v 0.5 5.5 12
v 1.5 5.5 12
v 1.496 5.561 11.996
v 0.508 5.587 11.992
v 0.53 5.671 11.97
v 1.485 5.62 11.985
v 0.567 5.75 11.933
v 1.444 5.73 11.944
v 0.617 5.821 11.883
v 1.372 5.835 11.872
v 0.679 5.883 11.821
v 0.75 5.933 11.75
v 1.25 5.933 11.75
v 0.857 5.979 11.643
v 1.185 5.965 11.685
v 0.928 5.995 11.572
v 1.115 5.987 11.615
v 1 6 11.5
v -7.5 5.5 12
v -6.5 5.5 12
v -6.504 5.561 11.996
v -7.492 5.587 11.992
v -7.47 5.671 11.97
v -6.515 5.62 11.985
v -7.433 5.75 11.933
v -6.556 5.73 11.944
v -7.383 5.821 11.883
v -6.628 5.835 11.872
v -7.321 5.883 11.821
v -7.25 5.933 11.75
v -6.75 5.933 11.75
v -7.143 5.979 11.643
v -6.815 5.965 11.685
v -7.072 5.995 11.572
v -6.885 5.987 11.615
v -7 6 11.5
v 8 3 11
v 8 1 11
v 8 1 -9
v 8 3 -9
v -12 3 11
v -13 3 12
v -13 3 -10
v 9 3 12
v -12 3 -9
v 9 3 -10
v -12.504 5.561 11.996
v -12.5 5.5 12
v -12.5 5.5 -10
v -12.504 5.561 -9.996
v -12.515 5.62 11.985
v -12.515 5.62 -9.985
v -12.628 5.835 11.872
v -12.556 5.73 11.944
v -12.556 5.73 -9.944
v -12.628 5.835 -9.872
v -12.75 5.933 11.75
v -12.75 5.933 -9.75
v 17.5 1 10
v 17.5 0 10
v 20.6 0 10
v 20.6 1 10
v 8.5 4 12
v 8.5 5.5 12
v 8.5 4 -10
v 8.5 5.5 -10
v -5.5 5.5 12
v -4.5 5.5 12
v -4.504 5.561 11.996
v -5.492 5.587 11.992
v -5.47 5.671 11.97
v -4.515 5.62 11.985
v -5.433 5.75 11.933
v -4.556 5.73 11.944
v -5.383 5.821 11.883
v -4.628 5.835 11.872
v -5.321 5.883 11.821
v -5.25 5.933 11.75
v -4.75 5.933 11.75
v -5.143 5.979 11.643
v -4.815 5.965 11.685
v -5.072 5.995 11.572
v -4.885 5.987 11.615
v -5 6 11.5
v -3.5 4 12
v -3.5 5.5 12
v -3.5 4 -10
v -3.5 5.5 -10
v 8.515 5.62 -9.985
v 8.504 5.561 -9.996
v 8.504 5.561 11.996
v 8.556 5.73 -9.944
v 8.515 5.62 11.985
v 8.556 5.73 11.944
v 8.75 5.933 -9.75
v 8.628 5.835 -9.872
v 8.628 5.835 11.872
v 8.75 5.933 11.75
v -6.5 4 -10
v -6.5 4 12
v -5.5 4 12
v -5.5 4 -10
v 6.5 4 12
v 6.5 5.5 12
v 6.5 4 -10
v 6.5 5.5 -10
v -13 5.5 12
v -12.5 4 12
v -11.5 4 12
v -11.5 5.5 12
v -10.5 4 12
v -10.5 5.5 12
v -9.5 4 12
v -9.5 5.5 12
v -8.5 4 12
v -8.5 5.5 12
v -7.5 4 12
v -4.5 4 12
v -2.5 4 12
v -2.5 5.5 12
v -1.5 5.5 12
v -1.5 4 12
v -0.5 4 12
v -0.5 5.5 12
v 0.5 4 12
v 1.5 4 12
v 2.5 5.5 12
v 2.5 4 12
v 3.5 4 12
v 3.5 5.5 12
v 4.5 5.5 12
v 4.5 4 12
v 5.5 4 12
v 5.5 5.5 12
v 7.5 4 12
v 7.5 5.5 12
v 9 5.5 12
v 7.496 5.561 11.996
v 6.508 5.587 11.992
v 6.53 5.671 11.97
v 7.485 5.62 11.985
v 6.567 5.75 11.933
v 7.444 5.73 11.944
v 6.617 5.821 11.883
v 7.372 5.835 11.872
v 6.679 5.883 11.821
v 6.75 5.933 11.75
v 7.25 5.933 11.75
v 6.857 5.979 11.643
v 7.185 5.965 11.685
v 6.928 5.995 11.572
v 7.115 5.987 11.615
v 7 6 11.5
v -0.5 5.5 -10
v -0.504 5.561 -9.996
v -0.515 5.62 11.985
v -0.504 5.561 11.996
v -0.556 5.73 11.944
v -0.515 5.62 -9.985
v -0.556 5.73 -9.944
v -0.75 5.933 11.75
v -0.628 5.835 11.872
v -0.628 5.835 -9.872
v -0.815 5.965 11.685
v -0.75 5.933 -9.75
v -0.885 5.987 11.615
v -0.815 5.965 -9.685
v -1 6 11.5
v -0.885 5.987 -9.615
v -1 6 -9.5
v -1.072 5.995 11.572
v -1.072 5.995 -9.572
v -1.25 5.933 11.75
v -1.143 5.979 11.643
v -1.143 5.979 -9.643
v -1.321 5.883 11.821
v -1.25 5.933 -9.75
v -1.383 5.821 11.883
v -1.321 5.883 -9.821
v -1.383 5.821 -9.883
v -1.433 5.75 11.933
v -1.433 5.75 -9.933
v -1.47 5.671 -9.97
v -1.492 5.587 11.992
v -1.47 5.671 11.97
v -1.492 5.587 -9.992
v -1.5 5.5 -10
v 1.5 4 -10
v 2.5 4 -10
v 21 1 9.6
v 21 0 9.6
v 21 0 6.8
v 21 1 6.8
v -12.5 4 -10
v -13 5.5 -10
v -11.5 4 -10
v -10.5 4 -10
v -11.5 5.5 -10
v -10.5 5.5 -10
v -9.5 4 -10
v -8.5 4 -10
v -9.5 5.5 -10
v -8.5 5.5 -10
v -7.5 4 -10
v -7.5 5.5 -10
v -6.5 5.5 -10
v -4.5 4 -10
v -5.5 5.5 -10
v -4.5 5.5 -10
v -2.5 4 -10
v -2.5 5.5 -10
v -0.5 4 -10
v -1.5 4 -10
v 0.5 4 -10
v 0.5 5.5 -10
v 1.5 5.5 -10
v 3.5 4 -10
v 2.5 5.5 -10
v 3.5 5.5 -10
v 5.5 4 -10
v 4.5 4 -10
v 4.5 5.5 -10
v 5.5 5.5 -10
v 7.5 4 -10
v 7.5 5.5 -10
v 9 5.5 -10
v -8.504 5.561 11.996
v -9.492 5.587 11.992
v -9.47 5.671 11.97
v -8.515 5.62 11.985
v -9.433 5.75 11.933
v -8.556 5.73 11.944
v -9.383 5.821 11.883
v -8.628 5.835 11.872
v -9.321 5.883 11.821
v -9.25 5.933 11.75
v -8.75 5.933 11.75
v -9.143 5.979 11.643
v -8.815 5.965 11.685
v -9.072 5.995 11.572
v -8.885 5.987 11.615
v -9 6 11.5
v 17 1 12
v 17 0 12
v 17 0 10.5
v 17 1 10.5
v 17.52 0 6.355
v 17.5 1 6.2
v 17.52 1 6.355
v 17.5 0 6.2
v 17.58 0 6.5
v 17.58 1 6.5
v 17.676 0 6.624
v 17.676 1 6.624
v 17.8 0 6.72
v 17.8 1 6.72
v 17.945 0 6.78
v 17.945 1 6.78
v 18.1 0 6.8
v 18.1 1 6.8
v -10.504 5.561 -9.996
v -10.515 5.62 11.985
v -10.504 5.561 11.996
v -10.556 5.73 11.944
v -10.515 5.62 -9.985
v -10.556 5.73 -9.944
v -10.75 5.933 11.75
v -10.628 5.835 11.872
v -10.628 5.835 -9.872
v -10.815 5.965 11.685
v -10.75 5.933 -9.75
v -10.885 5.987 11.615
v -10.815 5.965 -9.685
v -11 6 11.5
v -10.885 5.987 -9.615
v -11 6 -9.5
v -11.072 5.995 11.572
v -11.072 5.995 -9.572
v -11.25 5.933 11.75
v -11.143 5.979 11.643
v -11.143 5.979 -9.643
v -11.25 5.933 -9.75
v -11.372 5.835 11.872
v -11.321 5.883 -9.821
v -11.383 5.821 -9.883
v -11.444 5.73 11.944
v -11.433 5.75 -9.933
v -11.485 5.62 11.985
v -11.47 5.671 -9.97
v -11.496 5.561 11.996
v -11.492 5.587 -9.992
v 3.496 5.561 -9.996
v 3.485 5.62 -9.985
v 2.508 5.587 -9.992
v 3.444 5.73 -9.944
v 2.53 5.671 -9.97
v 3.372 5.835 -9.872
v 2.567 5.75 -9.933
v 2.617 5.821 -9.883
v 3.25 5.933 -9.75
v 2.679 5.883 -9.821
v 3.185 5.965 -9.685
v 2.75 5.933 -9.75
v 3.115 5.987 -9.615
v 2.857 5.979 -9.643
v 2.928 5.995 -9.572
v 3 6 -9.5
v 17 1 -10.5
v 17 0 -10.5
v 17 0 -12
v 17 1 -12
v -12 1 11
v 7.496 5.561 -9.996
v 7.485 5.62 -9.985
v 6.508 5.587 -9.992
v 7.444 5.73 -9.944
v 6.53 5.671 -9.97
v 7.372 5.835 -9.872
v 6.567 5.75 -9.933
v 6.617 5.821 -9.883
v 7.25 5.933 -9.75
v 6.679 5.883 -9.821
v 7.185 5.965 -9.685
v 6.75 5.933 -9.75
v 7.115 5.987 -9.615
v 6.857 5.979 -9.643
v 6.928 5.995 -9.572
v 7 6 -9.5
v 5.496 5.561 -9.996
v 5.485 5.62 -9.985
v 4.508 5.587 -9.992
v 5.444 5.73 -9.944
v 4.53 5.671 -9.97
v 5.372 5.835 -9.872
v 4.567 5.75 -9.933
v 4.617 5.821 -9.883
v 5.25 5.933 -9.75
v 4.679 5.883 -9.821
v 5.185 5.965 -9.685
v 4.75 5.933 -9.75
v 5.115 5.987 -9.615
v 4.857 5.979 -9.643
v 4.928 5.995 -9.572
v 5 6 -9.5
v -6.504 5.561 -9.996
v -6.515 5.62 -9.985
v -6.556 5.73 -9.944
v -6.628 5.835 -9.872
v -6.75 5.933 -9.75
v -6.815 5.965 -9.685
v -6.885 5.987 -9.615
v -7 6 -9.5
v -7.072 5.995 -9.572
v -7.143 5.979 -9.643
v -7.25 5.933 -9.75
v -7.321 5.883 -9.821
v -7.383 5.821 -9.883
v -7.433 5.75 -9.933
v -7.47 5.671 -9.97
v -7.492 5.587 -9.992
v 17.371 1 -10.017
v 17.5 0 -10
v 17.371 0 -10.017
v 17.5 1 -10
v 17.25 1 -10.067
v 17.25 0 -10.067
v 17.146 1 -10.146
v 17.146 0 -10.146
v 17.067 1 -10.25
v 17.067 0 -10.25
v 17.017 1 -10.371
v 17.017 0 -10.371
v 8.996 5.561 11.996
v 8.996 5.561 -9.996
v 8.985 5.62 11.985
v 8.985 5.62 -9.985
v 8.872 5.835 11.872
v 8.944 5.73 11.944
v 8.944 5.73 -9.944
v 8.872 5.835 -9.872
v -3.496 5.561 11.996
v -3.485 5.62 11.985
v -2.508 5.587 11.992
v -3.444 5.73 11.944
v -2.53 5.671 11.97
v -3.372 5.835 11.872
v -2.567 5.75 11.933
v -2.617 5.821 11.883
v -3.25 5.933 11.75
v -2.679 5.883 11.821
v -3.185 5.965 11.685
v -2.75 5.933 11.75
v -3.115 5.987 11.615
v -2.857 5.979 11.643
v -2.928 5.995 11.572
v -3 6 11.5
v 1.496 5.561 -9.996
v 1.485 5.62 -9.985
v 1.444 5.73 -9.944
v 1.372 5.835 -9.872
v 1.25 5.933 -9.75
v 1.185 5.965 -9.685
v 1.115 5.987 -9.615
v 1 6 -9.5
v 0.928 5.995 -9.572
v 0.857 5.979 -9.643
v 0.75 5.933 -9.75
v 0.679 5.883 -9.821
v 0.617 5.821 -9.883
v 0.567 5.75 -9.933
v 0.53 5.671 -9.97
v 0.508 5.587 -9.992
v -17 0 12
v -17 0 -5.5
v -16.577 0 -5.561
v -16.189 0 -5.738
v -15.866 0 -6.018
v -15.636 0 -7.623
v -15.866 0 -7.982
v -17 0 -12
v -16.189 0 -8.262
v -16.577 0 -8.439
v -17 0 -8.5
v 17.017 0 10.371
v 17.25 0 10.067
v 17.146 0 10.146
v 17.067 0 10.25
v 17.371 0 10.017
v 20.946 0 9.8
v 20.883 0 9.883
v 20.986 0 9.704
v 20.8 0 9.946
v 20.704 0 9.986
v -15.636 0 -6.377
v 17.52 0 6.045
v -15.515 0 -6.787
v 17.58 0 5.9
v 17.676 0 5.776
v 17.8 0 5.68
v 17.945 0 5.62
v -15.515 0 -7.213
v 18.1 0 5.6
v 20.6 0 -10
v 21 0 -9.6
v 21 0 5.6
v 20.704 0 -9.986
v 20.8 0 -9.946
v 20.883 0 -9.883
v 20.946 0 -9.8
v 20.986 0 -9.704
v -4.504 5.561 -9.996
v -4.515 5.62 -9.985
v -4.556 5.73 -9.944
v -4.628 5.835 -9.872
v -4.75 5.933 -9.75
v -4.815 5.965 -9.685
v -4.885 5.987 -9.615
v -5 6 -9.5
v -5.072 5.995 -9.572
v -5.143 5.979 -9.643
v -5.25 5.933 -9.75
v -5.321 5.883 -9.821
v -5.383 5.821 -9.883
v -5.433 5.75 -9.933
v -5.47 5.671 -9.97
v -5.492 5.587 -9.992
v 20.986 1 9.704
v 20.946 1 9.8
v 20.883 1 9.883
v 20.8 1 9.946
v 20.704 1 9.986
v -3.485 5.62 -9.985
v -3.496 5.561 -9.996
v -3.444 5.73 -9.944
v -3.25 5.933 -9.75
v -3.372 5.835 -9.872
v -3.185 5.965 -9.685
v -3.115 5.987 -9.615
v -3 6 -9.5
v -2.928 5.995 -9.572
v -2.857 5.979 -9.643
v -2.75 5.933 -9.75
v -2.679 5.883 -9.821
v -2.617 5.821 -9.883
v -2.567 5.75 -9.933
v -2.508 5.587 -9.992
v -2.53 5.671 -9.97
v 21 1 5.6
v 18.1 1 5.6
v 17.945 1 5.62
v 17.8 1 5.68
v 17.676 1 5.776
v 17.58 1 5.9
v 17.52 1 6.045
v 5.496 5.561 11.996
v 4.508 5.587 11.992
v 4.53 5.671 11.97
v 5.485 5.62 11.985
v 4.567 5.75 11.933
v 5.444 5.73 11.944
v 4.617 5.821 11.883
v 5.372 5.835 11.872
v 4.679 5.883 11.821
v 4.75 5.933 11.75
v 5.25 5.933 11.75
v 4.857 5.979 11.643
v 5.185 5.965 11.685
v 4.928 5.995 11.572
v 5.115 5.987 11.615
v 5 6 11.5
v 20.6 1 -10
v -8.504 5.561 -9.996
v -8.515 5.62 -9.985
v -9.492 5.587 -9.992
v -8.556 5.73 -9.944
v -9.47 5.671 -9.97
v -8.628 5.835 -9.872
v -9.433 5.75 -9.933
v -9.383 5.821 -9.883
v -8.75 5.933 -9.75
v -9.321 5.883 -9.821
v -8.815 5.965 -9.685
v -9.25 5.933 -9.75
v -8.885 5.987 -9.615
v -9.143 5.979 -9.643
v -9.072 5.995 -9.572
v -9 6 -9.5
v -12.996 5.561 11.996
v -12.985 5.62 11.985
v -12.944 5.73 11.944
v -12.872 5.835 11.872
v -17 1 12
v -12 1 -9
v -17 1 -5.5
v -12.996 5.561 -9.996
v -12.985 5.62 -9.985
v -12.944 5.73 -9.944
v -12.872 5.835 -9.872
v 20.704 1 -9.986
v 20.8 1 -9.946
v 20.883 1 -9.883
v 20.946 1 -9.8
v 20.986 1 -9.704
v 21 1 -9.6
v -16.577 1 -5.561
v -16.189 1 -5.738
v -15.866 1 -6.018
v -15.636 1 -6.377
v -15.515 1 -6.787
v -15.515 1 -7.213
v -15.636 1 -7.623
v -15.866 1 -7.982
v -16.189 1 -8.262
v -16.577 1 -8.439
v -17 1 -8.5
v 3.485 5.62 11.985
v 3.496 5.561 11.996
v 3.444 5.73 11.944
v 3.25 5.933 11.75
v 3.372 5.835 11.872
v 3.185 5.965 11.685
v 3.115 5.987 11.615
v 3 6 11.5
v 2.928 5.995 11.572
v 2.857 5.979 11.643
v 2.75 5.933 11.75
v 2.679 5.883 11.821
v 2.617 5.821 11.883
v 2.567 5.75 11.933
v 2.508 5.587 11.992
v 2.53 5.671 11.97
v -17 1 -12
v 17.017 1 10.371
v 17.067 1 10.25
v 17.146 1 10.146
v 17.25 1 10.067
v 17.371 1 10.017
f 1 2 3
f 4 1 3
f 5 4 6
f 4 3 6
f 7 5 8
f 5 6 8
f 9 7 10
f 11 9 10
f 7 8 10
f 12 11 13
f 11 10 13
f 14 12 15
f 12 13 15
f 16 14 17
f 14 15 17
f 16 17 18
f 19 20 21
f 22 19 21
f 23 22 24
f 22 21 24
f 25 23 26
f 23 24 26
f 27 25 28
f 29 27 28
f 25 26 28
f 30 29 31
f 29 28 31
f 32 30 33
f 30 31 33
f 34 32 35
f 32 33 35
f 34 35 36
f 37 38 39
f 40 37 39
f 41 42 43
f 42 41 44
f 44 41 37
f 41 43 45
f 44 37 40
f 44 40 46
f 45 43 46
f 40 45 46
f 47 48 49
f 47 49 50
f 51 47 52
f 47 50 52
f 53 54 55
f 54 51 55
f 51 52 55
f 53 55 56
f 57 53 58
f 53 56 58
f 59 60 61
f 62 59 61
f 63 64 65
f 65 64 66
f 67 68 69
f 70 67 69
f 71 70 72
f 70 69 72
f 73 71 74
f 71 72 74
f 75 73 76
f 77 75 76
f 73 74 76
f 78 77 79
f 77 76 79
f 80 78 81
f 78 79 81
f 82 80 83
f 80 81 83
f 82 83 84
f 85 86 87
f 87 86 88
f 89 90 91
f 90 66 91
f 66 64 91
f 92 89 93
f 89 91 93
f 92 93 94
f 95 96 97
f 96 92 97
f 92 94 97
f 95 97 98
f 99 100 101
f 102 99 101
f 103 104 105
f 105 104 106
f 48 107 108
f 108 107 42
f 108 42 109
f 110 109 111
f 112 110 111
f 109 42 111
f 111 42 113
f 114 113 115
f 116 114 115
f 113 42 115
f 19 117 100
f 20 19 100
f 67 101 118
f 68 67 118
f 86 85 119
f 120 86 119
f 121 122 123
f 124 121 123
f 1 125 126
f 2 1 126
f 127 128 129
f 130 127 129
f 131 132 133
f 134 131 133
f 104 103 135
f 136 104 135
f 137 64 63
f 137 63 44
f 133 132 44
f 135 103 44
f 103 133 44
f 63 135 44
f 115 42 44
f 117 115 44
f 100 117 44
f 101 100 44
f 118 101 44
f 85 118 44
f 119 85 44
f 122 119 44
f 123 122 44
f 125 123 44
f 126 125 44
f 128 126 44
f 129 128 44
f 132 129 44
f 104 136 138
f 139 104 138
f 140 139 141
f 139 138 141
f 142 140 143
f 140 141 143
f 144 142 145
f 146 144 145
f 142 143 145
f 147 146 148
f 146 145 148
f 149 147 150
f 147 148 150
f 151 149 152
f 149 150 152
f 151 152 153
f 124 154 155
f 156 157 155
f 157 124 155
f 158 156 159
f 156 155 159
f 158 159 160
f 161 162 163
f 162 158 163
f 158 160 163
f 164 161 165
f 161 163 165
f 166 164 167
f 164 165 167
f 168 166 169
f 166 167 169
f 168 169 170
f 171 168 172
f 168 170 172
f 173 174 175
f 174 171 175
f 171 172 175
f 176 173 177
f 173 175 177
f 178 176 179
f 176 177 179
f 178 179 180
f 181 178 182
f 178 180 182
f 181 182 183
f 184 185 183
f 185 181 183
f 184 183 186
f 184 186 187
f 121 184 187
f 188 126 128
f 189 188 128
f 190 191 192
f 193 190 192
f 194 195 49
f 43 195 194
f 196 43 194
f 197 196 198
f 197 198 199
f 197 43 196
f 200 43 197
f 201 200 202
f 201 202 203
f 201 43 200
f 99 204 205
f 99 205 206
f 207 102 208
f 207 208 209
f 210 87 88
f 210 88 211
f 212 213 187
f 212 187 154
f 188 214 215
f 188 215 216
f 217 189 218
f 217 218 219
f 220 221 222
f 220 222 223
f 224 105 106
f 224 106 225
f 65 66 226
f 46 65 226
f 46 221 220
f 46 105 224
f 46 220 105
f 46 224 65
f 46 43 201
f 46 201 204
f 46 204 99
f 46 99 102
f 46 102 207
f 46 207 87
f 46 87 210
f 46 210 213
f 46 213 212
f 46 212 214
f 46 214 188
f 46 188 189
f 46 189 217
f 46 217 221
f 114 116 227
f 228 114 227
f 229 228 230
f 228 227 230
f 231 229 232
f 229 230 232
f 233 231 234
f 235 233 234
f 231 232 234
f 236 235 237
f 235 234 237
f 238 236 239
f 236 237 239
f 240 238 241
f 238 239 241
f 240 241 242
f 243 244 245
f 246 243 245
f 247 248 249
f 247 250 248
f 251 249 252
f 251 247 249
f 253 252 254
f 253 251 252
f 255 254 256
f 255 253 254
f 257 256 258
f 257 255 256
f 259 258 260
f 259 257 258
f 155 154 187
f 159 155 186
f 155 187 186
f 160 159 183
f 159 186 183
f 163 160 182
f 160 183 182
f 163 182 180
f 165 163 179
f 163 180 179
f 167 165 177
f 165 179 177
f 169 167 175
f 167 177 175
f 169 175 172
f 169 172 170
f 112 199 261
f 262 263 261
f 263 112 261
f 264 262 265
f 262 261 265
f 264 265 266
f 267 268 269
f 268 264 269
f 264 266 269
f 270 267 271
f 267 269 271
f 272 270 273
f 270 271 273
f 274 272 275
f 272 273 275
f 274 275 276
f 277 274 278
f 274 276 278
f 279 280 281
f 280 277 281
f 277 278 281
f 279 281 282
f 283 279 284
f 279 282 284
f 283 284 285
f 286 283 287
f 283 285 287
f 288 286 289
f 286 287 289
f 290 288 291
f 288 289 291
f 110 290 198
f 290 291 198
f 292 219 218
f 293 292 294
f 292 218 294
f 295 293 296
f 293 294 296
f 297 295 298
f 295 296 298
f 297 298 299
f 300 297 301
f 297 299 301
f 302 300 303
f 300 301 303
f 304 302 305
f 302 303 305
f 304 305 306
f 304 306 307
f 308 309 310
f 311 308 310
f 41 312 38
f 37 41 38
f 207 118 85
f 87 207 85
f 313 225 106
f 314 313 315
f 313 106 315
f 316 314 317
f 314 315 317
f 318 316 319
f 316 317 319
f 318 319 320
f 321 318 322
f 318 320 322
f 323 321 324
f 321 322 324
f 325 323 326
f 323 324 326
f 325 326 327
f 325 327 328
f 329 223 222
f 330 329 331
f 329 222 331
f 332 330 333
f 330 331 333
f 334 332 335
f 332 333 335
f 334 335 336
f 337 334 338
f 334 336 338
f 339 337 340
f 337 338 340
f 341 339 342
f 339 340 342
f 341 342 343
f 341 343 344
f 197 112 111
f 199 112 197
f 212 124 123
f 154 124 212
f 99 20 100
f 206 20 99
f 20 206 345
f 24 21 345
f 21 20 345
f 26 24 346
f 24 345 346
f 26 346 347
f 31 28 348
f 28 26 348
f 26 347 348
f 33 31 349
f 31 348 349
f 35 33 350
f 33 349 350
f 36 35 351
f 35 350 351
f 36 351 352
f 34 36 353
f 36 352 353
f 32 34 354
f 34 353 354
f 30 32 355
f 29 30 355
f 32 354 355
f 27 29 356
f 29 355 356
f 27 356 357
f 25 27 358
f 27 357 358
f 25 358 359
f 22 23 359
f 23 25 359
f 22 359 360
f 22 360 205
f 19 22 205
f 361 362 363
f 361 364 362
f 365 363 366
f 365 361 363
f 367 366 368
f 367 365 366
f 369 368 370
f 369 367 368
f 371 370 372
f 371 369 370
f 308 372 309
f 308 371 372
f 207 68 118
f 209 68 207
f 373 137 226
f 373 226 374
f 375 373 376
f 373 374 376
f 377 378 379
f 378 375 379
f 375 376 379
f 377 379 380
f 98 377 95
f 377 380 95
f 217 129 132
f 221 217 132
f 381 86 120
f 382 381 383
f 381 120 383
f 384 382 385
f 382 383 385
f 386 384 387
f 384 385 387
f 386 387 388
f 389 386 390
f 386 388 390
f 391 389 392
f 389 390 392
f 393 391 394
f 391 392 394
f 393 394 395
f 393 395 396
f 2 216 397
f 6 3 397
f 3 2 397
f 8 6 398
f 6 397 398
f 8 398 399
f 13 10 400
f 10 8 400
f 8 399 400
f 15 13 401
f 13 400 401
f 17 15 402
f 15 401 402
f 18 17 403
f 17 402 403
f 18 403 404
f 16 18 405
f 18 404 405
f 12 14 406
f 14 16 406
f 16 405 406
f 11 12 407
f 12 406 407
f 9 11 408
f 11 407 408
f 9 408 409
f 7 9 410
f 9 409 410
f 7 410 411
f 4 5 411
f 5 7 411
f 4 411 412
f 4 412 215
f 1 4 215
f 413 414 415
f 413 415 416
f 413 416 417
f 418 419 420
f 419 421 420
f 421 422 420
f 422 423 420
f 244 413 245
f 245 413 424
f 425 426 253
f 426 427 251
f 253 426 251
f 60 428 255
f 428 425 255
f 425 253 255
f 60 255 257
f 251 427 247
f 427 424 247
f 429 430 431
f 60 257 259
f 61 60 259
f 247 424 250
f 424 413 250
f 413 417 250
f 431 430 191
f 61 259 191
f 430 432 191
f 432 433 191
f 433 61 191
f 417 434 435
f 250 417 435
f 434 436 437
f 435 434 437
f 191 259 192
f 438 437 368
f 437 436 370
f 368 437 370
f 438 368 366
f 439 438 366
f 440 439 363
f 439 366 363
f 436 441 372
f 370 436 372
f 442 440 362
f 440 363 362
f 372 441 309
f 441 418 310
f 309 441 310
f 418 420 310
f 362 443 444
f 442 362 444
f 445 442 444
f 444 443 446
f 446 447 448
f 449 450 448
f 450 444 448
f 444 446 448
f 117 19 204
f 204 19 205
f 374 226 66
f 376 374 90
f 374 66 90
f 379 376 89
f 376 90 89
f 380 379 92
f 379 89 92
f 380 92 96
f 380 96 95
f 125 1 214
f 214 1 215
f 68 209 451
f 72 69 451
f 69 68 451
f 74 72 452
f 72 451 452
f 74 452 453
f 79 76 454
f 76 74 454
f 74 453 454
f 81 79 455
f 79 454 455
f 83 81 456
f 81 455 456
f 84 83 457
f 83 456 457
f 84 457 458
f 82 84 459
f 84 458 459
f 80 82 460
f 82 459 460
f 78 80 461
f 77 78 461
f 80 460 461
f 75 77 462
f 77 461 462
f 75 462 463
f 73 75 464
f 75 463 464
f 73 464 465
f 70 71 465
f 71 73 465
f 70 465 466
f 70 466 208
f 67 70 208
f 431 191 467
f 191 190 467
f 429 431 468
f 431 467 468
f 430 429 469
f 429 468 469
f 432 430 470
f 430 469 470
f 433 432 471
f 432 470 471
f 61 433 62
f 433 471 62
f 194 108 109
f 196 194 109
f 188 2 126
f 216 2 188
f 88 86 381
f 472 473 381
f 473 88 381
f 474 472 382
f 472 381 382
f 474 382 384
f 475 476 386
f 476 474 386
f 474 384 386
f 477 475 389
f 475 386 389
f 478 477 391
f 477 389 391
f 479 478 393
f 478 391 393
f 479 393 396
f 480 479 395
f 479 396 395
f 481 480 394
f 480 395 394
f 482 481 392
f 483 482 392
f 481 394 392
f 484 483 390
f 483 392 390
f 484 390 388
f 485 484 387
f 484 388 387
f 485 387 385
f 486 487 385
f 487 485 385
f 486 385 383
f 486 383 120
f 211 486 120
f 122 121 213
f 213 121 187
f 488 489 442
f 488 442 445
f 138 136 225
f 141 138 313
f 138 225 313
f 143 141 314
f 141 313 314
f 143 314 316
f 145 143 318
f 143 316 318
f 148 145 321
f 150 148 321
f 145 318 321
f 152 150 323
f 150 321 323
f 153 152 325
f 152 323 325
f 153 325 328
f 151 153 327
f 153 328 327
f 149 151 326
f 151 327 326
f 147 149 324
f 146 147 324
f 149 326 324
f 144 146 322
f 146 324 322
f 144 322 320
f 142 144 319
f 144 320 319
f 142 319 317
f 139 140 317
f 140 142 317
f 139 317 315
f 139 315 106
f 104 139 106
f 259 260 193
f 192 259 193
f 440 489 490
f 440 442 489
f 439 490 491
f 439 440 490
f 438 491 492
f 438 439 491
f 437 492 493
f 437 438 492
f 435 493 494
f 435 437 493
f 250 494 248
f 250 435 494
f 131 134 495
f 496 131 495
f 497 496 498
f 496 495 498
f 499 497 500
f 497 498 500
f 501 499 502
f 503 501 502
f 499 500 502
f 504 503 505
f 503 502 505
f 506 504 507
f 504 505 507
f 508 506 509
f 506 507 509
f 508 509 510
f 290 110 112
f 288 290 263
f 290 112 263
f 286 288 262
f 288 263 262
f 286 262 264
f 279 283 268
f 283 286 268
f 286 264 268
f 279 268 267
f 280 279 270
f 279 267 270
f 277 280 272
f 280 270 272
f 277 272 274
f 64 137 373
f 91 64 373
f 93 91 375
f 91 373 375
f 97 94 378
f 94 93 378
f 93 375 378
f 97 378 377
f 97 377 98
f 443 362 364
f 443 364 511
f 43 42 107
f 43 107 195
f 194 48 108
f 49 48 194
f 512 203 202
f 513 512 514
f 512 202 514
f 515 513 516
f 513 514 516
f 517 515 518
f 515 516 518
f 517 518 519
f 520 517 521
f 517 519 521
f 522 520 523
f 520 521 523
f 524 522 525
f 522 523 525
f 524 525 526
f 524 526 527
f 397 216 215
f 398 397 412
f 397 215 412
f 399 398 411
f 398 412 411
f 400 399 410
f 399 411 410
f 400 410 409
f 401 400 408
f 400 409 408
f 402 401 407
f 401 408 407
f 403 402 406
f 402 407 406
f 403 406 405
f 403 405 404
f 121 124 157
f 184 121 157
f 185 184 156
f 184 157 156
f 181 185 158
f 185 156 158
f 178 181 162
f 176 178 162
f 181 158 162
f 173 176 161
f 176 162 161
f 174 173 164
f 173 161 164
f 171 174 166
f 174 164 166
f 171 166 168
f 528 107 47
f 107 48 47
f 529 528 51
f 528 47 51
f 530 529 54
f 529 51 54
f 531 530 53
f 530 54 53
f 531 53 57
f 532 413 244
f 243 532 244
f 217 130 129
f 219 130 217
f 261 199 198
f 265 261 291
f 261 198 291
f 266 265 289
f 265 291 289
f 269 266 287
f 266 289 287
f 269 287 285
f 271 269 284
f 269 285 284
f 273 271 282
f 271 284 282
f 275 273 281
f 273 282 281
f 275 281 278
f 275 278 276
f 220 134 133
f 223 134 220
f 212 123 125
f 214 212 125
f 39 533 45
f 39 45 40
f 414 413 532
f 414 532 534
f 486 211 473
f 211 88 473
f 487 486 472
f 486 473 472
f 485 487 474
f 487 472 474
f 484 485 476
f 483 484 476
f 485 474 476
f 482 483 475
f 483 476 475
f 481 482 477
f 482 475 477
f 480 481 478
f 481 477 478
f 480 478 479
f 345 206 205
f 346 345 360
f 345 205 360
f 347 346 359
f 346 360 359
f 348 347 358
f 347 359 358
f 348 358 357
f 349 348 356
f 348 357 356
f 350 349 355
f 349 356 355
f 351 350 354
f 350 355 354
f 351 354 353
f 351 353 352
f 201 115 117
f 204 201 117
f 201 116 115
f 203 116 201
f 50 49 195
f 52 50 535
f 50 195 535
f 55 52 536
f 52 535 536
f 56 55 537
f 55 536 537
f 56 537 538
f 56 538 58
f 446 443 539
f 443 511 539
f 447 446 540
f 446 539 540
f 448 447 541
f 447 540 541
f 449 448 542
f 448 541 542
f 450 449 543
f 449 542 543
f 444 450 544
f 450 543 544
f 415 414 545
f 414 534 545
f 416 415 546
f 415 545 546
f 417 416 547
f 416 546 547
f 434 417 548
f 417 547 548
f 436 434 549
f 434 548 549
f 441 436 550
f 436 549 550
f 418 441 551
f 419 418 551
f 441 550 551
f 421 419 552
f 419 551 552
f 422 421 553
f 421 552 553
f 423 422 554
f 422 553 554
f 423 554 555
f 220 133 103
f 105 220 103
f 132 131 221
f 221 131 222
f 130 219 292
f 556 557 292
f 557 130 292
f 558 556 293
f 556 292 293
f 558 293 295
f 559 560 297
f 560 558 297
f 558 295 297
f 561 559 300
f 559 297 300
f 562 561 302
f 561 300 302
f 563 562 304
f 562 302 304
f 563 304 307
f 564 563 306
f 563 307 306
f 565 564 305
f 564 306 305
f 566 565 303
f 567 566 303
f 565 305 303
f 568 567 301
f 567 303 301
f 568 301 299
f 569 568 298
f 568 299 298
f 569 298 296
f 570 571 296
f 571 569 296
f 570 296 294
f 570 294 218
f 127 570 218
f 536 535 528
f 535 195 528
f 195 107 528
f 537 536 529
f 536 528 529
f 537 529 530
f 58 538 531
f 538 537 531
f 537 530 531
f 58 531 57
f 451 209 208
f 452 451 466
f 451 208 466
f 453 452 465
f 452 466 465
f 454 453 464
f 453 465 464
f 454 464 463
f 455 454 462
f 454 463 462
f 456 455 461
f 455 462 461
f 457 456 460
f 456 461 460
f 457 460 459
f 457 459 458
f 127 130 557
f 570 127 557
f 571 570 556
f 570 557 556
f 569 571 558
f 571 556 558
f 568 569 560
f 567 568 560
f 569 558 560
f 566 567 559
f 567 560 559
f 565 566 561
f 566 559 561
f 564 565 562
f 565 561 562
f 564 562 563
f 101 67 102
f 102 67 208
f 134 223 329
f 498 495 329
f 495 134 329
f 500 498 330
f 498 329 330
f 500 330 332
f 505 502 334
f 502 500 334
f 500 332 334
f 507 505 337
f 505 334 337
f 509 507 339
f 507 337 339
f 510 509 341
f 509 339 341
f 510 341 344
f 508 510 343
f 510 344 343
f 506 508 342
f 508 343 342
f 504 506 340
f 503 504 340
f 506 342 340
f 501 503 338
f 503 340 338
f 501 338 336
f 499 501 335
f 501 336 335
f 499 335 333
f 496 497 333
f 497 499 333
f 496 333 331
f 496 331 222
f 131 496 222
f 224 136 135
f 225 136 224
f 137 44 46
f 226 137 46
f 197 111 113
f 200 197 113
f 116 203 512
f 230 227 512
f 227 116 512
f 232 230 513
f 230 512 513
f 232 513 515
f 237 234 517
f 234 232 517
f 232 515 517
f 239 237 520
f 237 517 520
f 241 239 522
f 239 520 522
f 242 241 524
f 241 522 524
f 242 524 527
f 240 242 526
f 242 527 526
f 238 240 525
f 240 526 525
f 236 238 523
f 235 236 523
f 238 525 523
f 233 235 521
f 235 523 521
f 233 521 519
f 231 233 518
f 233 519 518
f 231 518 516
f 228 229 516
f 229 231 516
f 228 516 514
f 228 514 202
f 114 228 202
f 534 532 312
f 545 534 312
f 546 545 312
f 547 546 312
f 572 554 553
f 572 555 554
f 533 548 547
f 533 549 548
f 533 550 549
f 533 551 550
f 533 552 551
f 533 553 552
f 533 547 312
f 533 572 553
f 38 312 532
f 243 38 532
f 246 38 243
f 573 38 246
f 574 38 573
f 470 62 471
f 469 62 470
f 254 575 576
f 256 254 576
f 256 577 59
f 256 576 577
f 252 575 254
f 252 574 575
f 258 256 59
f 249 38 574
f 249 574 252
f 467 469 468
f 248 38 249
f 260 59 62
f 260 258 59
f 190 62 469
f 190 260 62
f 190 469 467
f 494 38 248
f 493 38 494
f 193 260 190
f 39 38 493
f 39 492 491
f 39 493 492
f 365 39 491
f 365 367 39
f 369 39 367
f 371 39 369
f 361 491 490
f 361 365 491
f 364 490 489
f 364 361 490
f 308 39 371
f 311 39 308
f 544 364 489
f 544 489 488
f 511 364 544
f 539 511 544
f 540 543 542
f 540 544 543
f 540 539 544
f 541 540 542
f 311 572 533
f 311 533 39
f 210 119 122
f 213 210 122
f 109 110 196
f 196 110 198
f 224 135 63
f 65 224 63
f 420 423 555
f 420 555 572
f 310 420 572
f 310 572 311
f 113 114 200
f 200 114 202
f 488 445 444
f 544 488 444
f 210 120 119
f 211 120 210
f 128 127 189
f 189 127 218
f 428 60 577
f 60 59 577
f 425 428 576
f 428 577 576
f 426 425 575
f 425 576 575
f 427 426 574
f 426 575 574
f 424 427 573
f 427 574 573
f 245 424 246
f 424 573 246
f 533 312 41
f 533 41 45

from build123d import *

# Parameters (mm, degrees)
SKETCH_1_W          = 34
SKETCH_1_H          = 24
EXTRUDE_1_DEPTH     = 1
SKETCH_2_W          = 4
SKETCH_2_H          = 20
EXTRUDE_2_DEPTH     = 1
SKETCH_3_W          = 3.5
SKETCH_3_H          = 1.2
CUT_EXTRUDE_1_DEPTH = 25.207436874
FILLET_1_R          = 0.6
FILLET_2_R          = 0.5
FILLET_3_R          = 0.4
SKETCH_4_R          = 1.5
CUT_EXTRUDE_2_DEPTH = 25.207436874
SKETCH_8_W          = 20
SKETCH_8_H          = 20
EXTRUDE_9_DEPTH     = 2
SKETCH_5_W          = 22
SKETCH_5_H          = 22
EXTRUDE_3_DEPTH     = 3
SKETCH_6_W          = 1
SKETCH_6_H          = 22
CUT_EXTRUDE_3_DEPTH = 2
FILLET_4_R          = 0.5


# Some blends are built 0.0001 mm under size
with BuildPart() as part:
    # 草图1 → 凸台-拉伸1 (new body)
    with BuildSketch(Plane(origin=(0, 0, 0), x_dir=(1, 0, 0), z_dir=(0, 1, 0))):
        Rectangle(SKETCH_1_W, SKETCH_1_H)
    extrude(amount=EXTRUDE_1_DEPTH)

    # 草图2 → 凸台-拉伸2 (add)
    with BuildSketch(Plane(origin=(0, 0, 0), x_dir=(1, 0, 0), z_dir=(0, 1, 0))):
        with Locations((19, 0)):
            Rectangle(SKETCH_2_W, SKETCH_2_H)
    extrude(amount=EXTRUDE_2_DEPTH)

    # 草图3 → 切除-拉伸1 (cut, through all)
    with BuildSketch(Plane(origin=(0, 1, 0), x_dir=(1, 0, 0), z_dir=(0, 1, 0))):
        with Locations((19.25, -6.2)):
            Rectangle(SKETCH_3_W, SKETCH_3_H)
    extrude(amount=-CUT_EXTRUDE_1_DEPTH, mode=Mode.SUBTRACT)

    # 圆角1
    fillet_1_edges = [part.edges().sort_by_distance(p)[0] for p in [
        (17.5, 0.5, 6.8),
        (17.5, 0.5, 5.6),
    ]]
    fillet(fillet_1_edges, radius=FILLET_1_R - 0.0001)  # a hair under: the kernel refuses the full size

    # 圆角2
    fillet_2_edges = [part.edges().sort_by_distance(p)[0] for p in [
        (17, 0.5, -10),
        (17, 0.5, 10),
    ]]
    fillet(fillet_2_edges, radius=FILLET_2_R)

    # 圆角3
    fillet_3_edges = [part.edges().sort_by_distance(p)[0] for p in [
        (21, 0.5, 10),
        (21, 0.5, -10),
    ]]
    fillet(fillet_3_edges, radius=FILLET_3_R)

    # 草图4 → 切除-拉伸2 (cut, through all)
    with BuildSketch(Plane(origin=(0, 1, 0), x_dir=(1, 0, 0), z_dir=(0, 1, 0))):
        with Locations((-17, 7)):
            Circle(SKETCH_4_R)
    extrude(amount=-CUT_EXTRUDE_2_DEPTH, mode=Mode.SUBTRACT)

    # 草图8 → 凸台-拉伸9 (add)
    with BuildSketch(Plane(origin=(0, 1, 0), x_dir=(1, 0, 0), z_dir=(0, 1, 0))):
        with Locations((-2, -1)):
            Rectangle(SKETCH_8_W, SKETCH_8_H)
    extrude(amount=EXTRUDE_9_DEPTH)

    # 草图5 → 凸台-拉伸3 (add)
    with BuildSketch(Plane(origin=(0, 3, 0), x_dir=(1, 0, 0), z_dir=(0, 1, 0))):
        with Locations((-2, -1)):
            Rectangle(SKETCH_5_W, SKETCH_5_H)
    extrude(amount=EXTRUDE_3_DEPTH)

    # 草图6 → 切除-拉伸3 (cut)
    with BuildSketch(Plane(origin=(0, 6, 0), x_dir=(1, 0, 0), z_dir=(0, 1, 0))):
        with Locations((-2, -1)):
            Rectangle(SKETCH_6_W, SKETCH_6_H)
        with Locations((0, -1)):
            Rectangle(SKETCH_6_W, SKETCH_6_H)
        with Locations((2, -1)):
            Rectangle(SKETCH_6_W, SKETCH_6_H)
        with Locations((4, -1)):
            Rectangle(SKETCH_6_W, SKETCH_6_H)
        with Locations((6, -1)):
            Rectangle(SKETCH_6_W, SKETCH_6_H)
        with Locations((8, -1)):
            Rectangle(SKETCH_6_W, SKETCH_6_H)
        with Locations((-4, -1)):
            Rectangle(SKETCH_6_W, SKETCH_6_H)
        with Locations((-6, -1)):
            Rectangle(SKETCH_6_W, SKETCH_6_H)
        with Locations((-8, -1)):
            Rectangle(SKETCH_6_W, SKETCH_6_H)
        with Locations((-10, -1)):
            Rectangle(SKETCH_6_W, SKETCH_6_H)
        with Locations((-12, -1)):
            Rectangle(SKETCH_6_W, SKETCH_6_H)
    extrude(amount=-CUT_EXTRUDE_3_DEPTH, mode=Mode.SUBTRACT)

    # 圆角4
    # the kernel refuses this fillet: 0.5 mm, written as the material it takes off along each edge
    with BuildSketch(Plane(origin=(-13, 6, 13.25), x_dir=(0, -1, 0), z_dir=(0, 0, -1)), Plane(origin=(-11.5, 6, 13.25), x_dir=(0, -1, 0), z_dir=(0, 0, -1)), Plane(origin=(-9.5, 6, 13.25), x_dir=(0, -1, 0), z_dir=(0, 0, -1)), Plane(origin=(0.5, 6, 13.25), x_dir=(0, -1, 0), z_dir=(0, 0, -1)), Plane(origin=(2.5, 6, 13.25), x_dir=(0, -1, 0), z_dir=(0, 0, -1)), Plane(origin=(4.5, 6, 13.25), x_dir=(0, -1, 0), z_dir=(0, 0, -1)), Plane(origin=(6.5, 6, 13.25), x_dir=(0, -1, 0), z_dir=(0, 0, -1)), Plane(origin=(8.5, 6, 13.25), x_dir=(0, -1, 0), z_dir=(0, 0, -1)), Plane(origin=(-3.5, 6, 13.25), x_dir=(0, -1, 0), z_dir=(0, 0, -1)), Plane(origin=(-5.5, 6, 13.25), x_dir=(0, -1, 0), z_dir=(0, 0, -1)), Plane(origin=(-7.5, 6, 13.25), x_dir=(0, -1, 0), z_dir=(0, 0, -1)), Plane(origin=(-2.5, 6, 13.25), x_dir=(-1, 0, 0), z_dir=(0, 0, -1))) as fillet_4_piece_1:
        with BuildLine():
            CenterArc((FILLET_4_R, -FILLET_4_R), FILLET_4_R, 90, 90)
            Line((0, -FILLET_4_R), (0, 0))
            Line((0, 0), (FILLET_4_R, 0))
        make_face()
    extrude(amount=24.5, mode=Mode.SUBTRACT)
    with BuildSketch(Plane(origin=(-11.25, 6, 12), x_dir=(0, -1, 0), z_dir=(-1, 0, 0)), Plane(origin=(10.25, 6, 12), x_dir=(0, -1, 0), z_dir=(-1, 0, 0))) as fillet_4_piece_2:
        with BuildLine():
            CenterArc((FILLET_4_R, -FILLET_4_R), FILLET_4_R, 90, 90)
            Line((0, -FILLET_4_R), (0, 0))
            Line((0, 0), (FILLET_4_R, 0))
        make_face()
    extrude(amount=3, mode=Mode.SUBTRACT)
    with BuildSketch(Plane(origin=(9, 6, -11.25), x_dir=(-1, 0, 0), z_dir=(0, 0, 1)), Plane(origin=(-12.5, 6, -11.25), x_dir=(-1, 0, 0), z_dir=(0, 0, 1)), Plane(origin=(-10.5, 6, -11.25), x_dir=(-1, 0, 0), z_dir=(0, 0, 1)), Plane(origin=(-0.5, 6, -11.25), x_dir=(-1, 0, 0), z_dir=(0, 0, 1)), Plane(origin=(1.5, 6, -11.25), x_dir=(-1, 0, 0), z_dir=(0, 0, 1)), Plane(origin=(3.5, 6, -11.25), x_dir=(-1, 0, 0), z_dir=(0, 0, 1)), Plane(origin=(5.5, 6, -11.25), x_dir=(-1, 0, 0), z_dir=(0, 0, 1)), Plane(origin=(7.5, 6, -11.25), x_dir=(-1, 0, 0), z_dir=(0, 0, 1)), Plane(origin=(-4.5, 6, -11.25), x_dir=(-1, 0, 0), z_dir=(0, 0, 1)), Plane(origin=(-6.5, 6, -11.25), x_dir=(-1, 0, 0), z_dir=(0, 0, 1)), Plane(origin=(-8.5, 6, -11.25), x_dir=(-1, 0, 0), z_dir=(0, 0, 1)), Plane(origin=(-1.5, 6, -11.25), x_dir=(0, -1, 0), z_dir=(0, 0, 1))) as fillet_4_piece_3:
        with BuildLine():
            CenterArc((FILLET_4_R, FILLET_4_R), FILLET_4_R, 180, 90)
            Line((0, FILLET_4_R), (0, 0))
            Line((0, 0), (FILLET_4_R, 0))
        make_face()
    extrude(amount=24.5, mode=Mode.SUBTRACT)
    with BuildSketch(Plane(origin=(7.25, 6, -10), x_dir=(0, 0, 1), z_dir=(1, 0, 0)), Plane(origin=(-14.25, 6, -10), x_dir=(0, 0, 1), z_dir=(1, 0, 0))) as fillet_4_piece_4:
        with BuildLine():
            CenterArc((FILLET_4_R, FILLET_4_R), FILLET_4_R, 180, 90)
            Line((0, FILLET_4_R), (0, 0))
            Line((0, 0), (FILLET_4_R, 0))
        make_face()
    extrude(amount=3, mode=Mode.SUBTRACT)
    with BuildSketch(Plane(origin=(-9.25, 6, 12), x_dir=(0, -1, 0), z_dir=(-1, 0, 0)), Plane(origin=(-7.25, 6, 12), x_dir=(0, -1, 0), z_dir=(-1, 0, 0)), Plane(origin=(-5.25, 6, 12), x_dir=(0, -1, 0), z_dir=(-1, 0, 0)), Plane(origin=(-3.25, 6, 12), x_dir=(0, -1, 0), z_dir=(-1, 0, 0)), Plane(origin=(-1.25, 6, 12), x_dir=(0, -1, 0), z_dir=(-1, 0, 0)), Plane(origin=(0.75, 6, 12), x_dir=(0, -1, 0), z_dir=(-1, 0, 0)), Plane(origin=(2.75, 6, 12), x_dir=(0, -1, 0), z_dir=(-1, 0, 0)), Plane(origin=(4.75, 6, 12), x_dir=(0, -1, 0), z_dir=(-1, 0, 0)), Plane(origin=(6.75, 6, 12), x_dir=(0, -1, 0), z_dir=(-1, 0, 0)), Plane(origin=(8.75, 6, 12), x_dir=(0, -1, 0), z_dir=(-1, 0, 0))) as fillet_4_piece_5:
        with BuildLine():
            CenterArc((FILLET_4_R, -FILLET_4_R), FILLET_4_R, 90, 90)
            Line((0, -FILLET_4_R), (0, 0))
            Line((0, 0), (FILLET_4_R, 0))
        make_face()
    extrude(amount=3.5, mode=Mode.SUBTRACT)
    with BuildSketch(Plane(origin=(5.25, 6, -10), x_dir=(0, 0, 1), z_dir=(1, 0, 0)), Plane(origin=(3.25, 6, -10), x_dir=(0, 0, 1), z_dir=(1, 0, 0)), Plane(origin=(1.25, 6, -10), x_dir=(0, 0, 1), z_dir=(1, 0, 0)), Plane(origin=(-0.75, 6, -10), x_dir=(0, 0, 1), z_dir=(1, 0, 0)), Plane(origin=(-2.75, 6, -10), x_dir=(0, 0, 1), z_dir=(1, 0, 0)), Plane(origin=(-4.75, 6, -10), x_dir=(0, 0, 1), z_dir=(1, 0, 0)), Plane(origin=(-6.75, 6, -10), x_dir=(0, 0, 1), z_dir=(1, 0, 0)), Plane(origin=(-8.75, 6, -10), x_dir=(0, 0, 1), z_dir=(1, 0, 0)), Plane(origin=(-10.75, 6, -10), x_dir=(0, 0, 1), z_dir=(1, 0, 0)), Plane(origin=(-12.75, 6, -10), x_dir=(0, 0, 1), z_dir=(1, 0, 0))) as fillet_4_piece_6:
        with BuildLine():
            CenterArc((FILLET_4_R, FILLET_4_R), FILLET_4_R, 180, 90)
            Line((0, FILLET_4_R), (0, 0))
            Line((0, 0), (FILLET_4_R, 0))
        make_face()
    extrude(amount=3.5, mode=Mode.SUBTRACT)


solid = part.part
